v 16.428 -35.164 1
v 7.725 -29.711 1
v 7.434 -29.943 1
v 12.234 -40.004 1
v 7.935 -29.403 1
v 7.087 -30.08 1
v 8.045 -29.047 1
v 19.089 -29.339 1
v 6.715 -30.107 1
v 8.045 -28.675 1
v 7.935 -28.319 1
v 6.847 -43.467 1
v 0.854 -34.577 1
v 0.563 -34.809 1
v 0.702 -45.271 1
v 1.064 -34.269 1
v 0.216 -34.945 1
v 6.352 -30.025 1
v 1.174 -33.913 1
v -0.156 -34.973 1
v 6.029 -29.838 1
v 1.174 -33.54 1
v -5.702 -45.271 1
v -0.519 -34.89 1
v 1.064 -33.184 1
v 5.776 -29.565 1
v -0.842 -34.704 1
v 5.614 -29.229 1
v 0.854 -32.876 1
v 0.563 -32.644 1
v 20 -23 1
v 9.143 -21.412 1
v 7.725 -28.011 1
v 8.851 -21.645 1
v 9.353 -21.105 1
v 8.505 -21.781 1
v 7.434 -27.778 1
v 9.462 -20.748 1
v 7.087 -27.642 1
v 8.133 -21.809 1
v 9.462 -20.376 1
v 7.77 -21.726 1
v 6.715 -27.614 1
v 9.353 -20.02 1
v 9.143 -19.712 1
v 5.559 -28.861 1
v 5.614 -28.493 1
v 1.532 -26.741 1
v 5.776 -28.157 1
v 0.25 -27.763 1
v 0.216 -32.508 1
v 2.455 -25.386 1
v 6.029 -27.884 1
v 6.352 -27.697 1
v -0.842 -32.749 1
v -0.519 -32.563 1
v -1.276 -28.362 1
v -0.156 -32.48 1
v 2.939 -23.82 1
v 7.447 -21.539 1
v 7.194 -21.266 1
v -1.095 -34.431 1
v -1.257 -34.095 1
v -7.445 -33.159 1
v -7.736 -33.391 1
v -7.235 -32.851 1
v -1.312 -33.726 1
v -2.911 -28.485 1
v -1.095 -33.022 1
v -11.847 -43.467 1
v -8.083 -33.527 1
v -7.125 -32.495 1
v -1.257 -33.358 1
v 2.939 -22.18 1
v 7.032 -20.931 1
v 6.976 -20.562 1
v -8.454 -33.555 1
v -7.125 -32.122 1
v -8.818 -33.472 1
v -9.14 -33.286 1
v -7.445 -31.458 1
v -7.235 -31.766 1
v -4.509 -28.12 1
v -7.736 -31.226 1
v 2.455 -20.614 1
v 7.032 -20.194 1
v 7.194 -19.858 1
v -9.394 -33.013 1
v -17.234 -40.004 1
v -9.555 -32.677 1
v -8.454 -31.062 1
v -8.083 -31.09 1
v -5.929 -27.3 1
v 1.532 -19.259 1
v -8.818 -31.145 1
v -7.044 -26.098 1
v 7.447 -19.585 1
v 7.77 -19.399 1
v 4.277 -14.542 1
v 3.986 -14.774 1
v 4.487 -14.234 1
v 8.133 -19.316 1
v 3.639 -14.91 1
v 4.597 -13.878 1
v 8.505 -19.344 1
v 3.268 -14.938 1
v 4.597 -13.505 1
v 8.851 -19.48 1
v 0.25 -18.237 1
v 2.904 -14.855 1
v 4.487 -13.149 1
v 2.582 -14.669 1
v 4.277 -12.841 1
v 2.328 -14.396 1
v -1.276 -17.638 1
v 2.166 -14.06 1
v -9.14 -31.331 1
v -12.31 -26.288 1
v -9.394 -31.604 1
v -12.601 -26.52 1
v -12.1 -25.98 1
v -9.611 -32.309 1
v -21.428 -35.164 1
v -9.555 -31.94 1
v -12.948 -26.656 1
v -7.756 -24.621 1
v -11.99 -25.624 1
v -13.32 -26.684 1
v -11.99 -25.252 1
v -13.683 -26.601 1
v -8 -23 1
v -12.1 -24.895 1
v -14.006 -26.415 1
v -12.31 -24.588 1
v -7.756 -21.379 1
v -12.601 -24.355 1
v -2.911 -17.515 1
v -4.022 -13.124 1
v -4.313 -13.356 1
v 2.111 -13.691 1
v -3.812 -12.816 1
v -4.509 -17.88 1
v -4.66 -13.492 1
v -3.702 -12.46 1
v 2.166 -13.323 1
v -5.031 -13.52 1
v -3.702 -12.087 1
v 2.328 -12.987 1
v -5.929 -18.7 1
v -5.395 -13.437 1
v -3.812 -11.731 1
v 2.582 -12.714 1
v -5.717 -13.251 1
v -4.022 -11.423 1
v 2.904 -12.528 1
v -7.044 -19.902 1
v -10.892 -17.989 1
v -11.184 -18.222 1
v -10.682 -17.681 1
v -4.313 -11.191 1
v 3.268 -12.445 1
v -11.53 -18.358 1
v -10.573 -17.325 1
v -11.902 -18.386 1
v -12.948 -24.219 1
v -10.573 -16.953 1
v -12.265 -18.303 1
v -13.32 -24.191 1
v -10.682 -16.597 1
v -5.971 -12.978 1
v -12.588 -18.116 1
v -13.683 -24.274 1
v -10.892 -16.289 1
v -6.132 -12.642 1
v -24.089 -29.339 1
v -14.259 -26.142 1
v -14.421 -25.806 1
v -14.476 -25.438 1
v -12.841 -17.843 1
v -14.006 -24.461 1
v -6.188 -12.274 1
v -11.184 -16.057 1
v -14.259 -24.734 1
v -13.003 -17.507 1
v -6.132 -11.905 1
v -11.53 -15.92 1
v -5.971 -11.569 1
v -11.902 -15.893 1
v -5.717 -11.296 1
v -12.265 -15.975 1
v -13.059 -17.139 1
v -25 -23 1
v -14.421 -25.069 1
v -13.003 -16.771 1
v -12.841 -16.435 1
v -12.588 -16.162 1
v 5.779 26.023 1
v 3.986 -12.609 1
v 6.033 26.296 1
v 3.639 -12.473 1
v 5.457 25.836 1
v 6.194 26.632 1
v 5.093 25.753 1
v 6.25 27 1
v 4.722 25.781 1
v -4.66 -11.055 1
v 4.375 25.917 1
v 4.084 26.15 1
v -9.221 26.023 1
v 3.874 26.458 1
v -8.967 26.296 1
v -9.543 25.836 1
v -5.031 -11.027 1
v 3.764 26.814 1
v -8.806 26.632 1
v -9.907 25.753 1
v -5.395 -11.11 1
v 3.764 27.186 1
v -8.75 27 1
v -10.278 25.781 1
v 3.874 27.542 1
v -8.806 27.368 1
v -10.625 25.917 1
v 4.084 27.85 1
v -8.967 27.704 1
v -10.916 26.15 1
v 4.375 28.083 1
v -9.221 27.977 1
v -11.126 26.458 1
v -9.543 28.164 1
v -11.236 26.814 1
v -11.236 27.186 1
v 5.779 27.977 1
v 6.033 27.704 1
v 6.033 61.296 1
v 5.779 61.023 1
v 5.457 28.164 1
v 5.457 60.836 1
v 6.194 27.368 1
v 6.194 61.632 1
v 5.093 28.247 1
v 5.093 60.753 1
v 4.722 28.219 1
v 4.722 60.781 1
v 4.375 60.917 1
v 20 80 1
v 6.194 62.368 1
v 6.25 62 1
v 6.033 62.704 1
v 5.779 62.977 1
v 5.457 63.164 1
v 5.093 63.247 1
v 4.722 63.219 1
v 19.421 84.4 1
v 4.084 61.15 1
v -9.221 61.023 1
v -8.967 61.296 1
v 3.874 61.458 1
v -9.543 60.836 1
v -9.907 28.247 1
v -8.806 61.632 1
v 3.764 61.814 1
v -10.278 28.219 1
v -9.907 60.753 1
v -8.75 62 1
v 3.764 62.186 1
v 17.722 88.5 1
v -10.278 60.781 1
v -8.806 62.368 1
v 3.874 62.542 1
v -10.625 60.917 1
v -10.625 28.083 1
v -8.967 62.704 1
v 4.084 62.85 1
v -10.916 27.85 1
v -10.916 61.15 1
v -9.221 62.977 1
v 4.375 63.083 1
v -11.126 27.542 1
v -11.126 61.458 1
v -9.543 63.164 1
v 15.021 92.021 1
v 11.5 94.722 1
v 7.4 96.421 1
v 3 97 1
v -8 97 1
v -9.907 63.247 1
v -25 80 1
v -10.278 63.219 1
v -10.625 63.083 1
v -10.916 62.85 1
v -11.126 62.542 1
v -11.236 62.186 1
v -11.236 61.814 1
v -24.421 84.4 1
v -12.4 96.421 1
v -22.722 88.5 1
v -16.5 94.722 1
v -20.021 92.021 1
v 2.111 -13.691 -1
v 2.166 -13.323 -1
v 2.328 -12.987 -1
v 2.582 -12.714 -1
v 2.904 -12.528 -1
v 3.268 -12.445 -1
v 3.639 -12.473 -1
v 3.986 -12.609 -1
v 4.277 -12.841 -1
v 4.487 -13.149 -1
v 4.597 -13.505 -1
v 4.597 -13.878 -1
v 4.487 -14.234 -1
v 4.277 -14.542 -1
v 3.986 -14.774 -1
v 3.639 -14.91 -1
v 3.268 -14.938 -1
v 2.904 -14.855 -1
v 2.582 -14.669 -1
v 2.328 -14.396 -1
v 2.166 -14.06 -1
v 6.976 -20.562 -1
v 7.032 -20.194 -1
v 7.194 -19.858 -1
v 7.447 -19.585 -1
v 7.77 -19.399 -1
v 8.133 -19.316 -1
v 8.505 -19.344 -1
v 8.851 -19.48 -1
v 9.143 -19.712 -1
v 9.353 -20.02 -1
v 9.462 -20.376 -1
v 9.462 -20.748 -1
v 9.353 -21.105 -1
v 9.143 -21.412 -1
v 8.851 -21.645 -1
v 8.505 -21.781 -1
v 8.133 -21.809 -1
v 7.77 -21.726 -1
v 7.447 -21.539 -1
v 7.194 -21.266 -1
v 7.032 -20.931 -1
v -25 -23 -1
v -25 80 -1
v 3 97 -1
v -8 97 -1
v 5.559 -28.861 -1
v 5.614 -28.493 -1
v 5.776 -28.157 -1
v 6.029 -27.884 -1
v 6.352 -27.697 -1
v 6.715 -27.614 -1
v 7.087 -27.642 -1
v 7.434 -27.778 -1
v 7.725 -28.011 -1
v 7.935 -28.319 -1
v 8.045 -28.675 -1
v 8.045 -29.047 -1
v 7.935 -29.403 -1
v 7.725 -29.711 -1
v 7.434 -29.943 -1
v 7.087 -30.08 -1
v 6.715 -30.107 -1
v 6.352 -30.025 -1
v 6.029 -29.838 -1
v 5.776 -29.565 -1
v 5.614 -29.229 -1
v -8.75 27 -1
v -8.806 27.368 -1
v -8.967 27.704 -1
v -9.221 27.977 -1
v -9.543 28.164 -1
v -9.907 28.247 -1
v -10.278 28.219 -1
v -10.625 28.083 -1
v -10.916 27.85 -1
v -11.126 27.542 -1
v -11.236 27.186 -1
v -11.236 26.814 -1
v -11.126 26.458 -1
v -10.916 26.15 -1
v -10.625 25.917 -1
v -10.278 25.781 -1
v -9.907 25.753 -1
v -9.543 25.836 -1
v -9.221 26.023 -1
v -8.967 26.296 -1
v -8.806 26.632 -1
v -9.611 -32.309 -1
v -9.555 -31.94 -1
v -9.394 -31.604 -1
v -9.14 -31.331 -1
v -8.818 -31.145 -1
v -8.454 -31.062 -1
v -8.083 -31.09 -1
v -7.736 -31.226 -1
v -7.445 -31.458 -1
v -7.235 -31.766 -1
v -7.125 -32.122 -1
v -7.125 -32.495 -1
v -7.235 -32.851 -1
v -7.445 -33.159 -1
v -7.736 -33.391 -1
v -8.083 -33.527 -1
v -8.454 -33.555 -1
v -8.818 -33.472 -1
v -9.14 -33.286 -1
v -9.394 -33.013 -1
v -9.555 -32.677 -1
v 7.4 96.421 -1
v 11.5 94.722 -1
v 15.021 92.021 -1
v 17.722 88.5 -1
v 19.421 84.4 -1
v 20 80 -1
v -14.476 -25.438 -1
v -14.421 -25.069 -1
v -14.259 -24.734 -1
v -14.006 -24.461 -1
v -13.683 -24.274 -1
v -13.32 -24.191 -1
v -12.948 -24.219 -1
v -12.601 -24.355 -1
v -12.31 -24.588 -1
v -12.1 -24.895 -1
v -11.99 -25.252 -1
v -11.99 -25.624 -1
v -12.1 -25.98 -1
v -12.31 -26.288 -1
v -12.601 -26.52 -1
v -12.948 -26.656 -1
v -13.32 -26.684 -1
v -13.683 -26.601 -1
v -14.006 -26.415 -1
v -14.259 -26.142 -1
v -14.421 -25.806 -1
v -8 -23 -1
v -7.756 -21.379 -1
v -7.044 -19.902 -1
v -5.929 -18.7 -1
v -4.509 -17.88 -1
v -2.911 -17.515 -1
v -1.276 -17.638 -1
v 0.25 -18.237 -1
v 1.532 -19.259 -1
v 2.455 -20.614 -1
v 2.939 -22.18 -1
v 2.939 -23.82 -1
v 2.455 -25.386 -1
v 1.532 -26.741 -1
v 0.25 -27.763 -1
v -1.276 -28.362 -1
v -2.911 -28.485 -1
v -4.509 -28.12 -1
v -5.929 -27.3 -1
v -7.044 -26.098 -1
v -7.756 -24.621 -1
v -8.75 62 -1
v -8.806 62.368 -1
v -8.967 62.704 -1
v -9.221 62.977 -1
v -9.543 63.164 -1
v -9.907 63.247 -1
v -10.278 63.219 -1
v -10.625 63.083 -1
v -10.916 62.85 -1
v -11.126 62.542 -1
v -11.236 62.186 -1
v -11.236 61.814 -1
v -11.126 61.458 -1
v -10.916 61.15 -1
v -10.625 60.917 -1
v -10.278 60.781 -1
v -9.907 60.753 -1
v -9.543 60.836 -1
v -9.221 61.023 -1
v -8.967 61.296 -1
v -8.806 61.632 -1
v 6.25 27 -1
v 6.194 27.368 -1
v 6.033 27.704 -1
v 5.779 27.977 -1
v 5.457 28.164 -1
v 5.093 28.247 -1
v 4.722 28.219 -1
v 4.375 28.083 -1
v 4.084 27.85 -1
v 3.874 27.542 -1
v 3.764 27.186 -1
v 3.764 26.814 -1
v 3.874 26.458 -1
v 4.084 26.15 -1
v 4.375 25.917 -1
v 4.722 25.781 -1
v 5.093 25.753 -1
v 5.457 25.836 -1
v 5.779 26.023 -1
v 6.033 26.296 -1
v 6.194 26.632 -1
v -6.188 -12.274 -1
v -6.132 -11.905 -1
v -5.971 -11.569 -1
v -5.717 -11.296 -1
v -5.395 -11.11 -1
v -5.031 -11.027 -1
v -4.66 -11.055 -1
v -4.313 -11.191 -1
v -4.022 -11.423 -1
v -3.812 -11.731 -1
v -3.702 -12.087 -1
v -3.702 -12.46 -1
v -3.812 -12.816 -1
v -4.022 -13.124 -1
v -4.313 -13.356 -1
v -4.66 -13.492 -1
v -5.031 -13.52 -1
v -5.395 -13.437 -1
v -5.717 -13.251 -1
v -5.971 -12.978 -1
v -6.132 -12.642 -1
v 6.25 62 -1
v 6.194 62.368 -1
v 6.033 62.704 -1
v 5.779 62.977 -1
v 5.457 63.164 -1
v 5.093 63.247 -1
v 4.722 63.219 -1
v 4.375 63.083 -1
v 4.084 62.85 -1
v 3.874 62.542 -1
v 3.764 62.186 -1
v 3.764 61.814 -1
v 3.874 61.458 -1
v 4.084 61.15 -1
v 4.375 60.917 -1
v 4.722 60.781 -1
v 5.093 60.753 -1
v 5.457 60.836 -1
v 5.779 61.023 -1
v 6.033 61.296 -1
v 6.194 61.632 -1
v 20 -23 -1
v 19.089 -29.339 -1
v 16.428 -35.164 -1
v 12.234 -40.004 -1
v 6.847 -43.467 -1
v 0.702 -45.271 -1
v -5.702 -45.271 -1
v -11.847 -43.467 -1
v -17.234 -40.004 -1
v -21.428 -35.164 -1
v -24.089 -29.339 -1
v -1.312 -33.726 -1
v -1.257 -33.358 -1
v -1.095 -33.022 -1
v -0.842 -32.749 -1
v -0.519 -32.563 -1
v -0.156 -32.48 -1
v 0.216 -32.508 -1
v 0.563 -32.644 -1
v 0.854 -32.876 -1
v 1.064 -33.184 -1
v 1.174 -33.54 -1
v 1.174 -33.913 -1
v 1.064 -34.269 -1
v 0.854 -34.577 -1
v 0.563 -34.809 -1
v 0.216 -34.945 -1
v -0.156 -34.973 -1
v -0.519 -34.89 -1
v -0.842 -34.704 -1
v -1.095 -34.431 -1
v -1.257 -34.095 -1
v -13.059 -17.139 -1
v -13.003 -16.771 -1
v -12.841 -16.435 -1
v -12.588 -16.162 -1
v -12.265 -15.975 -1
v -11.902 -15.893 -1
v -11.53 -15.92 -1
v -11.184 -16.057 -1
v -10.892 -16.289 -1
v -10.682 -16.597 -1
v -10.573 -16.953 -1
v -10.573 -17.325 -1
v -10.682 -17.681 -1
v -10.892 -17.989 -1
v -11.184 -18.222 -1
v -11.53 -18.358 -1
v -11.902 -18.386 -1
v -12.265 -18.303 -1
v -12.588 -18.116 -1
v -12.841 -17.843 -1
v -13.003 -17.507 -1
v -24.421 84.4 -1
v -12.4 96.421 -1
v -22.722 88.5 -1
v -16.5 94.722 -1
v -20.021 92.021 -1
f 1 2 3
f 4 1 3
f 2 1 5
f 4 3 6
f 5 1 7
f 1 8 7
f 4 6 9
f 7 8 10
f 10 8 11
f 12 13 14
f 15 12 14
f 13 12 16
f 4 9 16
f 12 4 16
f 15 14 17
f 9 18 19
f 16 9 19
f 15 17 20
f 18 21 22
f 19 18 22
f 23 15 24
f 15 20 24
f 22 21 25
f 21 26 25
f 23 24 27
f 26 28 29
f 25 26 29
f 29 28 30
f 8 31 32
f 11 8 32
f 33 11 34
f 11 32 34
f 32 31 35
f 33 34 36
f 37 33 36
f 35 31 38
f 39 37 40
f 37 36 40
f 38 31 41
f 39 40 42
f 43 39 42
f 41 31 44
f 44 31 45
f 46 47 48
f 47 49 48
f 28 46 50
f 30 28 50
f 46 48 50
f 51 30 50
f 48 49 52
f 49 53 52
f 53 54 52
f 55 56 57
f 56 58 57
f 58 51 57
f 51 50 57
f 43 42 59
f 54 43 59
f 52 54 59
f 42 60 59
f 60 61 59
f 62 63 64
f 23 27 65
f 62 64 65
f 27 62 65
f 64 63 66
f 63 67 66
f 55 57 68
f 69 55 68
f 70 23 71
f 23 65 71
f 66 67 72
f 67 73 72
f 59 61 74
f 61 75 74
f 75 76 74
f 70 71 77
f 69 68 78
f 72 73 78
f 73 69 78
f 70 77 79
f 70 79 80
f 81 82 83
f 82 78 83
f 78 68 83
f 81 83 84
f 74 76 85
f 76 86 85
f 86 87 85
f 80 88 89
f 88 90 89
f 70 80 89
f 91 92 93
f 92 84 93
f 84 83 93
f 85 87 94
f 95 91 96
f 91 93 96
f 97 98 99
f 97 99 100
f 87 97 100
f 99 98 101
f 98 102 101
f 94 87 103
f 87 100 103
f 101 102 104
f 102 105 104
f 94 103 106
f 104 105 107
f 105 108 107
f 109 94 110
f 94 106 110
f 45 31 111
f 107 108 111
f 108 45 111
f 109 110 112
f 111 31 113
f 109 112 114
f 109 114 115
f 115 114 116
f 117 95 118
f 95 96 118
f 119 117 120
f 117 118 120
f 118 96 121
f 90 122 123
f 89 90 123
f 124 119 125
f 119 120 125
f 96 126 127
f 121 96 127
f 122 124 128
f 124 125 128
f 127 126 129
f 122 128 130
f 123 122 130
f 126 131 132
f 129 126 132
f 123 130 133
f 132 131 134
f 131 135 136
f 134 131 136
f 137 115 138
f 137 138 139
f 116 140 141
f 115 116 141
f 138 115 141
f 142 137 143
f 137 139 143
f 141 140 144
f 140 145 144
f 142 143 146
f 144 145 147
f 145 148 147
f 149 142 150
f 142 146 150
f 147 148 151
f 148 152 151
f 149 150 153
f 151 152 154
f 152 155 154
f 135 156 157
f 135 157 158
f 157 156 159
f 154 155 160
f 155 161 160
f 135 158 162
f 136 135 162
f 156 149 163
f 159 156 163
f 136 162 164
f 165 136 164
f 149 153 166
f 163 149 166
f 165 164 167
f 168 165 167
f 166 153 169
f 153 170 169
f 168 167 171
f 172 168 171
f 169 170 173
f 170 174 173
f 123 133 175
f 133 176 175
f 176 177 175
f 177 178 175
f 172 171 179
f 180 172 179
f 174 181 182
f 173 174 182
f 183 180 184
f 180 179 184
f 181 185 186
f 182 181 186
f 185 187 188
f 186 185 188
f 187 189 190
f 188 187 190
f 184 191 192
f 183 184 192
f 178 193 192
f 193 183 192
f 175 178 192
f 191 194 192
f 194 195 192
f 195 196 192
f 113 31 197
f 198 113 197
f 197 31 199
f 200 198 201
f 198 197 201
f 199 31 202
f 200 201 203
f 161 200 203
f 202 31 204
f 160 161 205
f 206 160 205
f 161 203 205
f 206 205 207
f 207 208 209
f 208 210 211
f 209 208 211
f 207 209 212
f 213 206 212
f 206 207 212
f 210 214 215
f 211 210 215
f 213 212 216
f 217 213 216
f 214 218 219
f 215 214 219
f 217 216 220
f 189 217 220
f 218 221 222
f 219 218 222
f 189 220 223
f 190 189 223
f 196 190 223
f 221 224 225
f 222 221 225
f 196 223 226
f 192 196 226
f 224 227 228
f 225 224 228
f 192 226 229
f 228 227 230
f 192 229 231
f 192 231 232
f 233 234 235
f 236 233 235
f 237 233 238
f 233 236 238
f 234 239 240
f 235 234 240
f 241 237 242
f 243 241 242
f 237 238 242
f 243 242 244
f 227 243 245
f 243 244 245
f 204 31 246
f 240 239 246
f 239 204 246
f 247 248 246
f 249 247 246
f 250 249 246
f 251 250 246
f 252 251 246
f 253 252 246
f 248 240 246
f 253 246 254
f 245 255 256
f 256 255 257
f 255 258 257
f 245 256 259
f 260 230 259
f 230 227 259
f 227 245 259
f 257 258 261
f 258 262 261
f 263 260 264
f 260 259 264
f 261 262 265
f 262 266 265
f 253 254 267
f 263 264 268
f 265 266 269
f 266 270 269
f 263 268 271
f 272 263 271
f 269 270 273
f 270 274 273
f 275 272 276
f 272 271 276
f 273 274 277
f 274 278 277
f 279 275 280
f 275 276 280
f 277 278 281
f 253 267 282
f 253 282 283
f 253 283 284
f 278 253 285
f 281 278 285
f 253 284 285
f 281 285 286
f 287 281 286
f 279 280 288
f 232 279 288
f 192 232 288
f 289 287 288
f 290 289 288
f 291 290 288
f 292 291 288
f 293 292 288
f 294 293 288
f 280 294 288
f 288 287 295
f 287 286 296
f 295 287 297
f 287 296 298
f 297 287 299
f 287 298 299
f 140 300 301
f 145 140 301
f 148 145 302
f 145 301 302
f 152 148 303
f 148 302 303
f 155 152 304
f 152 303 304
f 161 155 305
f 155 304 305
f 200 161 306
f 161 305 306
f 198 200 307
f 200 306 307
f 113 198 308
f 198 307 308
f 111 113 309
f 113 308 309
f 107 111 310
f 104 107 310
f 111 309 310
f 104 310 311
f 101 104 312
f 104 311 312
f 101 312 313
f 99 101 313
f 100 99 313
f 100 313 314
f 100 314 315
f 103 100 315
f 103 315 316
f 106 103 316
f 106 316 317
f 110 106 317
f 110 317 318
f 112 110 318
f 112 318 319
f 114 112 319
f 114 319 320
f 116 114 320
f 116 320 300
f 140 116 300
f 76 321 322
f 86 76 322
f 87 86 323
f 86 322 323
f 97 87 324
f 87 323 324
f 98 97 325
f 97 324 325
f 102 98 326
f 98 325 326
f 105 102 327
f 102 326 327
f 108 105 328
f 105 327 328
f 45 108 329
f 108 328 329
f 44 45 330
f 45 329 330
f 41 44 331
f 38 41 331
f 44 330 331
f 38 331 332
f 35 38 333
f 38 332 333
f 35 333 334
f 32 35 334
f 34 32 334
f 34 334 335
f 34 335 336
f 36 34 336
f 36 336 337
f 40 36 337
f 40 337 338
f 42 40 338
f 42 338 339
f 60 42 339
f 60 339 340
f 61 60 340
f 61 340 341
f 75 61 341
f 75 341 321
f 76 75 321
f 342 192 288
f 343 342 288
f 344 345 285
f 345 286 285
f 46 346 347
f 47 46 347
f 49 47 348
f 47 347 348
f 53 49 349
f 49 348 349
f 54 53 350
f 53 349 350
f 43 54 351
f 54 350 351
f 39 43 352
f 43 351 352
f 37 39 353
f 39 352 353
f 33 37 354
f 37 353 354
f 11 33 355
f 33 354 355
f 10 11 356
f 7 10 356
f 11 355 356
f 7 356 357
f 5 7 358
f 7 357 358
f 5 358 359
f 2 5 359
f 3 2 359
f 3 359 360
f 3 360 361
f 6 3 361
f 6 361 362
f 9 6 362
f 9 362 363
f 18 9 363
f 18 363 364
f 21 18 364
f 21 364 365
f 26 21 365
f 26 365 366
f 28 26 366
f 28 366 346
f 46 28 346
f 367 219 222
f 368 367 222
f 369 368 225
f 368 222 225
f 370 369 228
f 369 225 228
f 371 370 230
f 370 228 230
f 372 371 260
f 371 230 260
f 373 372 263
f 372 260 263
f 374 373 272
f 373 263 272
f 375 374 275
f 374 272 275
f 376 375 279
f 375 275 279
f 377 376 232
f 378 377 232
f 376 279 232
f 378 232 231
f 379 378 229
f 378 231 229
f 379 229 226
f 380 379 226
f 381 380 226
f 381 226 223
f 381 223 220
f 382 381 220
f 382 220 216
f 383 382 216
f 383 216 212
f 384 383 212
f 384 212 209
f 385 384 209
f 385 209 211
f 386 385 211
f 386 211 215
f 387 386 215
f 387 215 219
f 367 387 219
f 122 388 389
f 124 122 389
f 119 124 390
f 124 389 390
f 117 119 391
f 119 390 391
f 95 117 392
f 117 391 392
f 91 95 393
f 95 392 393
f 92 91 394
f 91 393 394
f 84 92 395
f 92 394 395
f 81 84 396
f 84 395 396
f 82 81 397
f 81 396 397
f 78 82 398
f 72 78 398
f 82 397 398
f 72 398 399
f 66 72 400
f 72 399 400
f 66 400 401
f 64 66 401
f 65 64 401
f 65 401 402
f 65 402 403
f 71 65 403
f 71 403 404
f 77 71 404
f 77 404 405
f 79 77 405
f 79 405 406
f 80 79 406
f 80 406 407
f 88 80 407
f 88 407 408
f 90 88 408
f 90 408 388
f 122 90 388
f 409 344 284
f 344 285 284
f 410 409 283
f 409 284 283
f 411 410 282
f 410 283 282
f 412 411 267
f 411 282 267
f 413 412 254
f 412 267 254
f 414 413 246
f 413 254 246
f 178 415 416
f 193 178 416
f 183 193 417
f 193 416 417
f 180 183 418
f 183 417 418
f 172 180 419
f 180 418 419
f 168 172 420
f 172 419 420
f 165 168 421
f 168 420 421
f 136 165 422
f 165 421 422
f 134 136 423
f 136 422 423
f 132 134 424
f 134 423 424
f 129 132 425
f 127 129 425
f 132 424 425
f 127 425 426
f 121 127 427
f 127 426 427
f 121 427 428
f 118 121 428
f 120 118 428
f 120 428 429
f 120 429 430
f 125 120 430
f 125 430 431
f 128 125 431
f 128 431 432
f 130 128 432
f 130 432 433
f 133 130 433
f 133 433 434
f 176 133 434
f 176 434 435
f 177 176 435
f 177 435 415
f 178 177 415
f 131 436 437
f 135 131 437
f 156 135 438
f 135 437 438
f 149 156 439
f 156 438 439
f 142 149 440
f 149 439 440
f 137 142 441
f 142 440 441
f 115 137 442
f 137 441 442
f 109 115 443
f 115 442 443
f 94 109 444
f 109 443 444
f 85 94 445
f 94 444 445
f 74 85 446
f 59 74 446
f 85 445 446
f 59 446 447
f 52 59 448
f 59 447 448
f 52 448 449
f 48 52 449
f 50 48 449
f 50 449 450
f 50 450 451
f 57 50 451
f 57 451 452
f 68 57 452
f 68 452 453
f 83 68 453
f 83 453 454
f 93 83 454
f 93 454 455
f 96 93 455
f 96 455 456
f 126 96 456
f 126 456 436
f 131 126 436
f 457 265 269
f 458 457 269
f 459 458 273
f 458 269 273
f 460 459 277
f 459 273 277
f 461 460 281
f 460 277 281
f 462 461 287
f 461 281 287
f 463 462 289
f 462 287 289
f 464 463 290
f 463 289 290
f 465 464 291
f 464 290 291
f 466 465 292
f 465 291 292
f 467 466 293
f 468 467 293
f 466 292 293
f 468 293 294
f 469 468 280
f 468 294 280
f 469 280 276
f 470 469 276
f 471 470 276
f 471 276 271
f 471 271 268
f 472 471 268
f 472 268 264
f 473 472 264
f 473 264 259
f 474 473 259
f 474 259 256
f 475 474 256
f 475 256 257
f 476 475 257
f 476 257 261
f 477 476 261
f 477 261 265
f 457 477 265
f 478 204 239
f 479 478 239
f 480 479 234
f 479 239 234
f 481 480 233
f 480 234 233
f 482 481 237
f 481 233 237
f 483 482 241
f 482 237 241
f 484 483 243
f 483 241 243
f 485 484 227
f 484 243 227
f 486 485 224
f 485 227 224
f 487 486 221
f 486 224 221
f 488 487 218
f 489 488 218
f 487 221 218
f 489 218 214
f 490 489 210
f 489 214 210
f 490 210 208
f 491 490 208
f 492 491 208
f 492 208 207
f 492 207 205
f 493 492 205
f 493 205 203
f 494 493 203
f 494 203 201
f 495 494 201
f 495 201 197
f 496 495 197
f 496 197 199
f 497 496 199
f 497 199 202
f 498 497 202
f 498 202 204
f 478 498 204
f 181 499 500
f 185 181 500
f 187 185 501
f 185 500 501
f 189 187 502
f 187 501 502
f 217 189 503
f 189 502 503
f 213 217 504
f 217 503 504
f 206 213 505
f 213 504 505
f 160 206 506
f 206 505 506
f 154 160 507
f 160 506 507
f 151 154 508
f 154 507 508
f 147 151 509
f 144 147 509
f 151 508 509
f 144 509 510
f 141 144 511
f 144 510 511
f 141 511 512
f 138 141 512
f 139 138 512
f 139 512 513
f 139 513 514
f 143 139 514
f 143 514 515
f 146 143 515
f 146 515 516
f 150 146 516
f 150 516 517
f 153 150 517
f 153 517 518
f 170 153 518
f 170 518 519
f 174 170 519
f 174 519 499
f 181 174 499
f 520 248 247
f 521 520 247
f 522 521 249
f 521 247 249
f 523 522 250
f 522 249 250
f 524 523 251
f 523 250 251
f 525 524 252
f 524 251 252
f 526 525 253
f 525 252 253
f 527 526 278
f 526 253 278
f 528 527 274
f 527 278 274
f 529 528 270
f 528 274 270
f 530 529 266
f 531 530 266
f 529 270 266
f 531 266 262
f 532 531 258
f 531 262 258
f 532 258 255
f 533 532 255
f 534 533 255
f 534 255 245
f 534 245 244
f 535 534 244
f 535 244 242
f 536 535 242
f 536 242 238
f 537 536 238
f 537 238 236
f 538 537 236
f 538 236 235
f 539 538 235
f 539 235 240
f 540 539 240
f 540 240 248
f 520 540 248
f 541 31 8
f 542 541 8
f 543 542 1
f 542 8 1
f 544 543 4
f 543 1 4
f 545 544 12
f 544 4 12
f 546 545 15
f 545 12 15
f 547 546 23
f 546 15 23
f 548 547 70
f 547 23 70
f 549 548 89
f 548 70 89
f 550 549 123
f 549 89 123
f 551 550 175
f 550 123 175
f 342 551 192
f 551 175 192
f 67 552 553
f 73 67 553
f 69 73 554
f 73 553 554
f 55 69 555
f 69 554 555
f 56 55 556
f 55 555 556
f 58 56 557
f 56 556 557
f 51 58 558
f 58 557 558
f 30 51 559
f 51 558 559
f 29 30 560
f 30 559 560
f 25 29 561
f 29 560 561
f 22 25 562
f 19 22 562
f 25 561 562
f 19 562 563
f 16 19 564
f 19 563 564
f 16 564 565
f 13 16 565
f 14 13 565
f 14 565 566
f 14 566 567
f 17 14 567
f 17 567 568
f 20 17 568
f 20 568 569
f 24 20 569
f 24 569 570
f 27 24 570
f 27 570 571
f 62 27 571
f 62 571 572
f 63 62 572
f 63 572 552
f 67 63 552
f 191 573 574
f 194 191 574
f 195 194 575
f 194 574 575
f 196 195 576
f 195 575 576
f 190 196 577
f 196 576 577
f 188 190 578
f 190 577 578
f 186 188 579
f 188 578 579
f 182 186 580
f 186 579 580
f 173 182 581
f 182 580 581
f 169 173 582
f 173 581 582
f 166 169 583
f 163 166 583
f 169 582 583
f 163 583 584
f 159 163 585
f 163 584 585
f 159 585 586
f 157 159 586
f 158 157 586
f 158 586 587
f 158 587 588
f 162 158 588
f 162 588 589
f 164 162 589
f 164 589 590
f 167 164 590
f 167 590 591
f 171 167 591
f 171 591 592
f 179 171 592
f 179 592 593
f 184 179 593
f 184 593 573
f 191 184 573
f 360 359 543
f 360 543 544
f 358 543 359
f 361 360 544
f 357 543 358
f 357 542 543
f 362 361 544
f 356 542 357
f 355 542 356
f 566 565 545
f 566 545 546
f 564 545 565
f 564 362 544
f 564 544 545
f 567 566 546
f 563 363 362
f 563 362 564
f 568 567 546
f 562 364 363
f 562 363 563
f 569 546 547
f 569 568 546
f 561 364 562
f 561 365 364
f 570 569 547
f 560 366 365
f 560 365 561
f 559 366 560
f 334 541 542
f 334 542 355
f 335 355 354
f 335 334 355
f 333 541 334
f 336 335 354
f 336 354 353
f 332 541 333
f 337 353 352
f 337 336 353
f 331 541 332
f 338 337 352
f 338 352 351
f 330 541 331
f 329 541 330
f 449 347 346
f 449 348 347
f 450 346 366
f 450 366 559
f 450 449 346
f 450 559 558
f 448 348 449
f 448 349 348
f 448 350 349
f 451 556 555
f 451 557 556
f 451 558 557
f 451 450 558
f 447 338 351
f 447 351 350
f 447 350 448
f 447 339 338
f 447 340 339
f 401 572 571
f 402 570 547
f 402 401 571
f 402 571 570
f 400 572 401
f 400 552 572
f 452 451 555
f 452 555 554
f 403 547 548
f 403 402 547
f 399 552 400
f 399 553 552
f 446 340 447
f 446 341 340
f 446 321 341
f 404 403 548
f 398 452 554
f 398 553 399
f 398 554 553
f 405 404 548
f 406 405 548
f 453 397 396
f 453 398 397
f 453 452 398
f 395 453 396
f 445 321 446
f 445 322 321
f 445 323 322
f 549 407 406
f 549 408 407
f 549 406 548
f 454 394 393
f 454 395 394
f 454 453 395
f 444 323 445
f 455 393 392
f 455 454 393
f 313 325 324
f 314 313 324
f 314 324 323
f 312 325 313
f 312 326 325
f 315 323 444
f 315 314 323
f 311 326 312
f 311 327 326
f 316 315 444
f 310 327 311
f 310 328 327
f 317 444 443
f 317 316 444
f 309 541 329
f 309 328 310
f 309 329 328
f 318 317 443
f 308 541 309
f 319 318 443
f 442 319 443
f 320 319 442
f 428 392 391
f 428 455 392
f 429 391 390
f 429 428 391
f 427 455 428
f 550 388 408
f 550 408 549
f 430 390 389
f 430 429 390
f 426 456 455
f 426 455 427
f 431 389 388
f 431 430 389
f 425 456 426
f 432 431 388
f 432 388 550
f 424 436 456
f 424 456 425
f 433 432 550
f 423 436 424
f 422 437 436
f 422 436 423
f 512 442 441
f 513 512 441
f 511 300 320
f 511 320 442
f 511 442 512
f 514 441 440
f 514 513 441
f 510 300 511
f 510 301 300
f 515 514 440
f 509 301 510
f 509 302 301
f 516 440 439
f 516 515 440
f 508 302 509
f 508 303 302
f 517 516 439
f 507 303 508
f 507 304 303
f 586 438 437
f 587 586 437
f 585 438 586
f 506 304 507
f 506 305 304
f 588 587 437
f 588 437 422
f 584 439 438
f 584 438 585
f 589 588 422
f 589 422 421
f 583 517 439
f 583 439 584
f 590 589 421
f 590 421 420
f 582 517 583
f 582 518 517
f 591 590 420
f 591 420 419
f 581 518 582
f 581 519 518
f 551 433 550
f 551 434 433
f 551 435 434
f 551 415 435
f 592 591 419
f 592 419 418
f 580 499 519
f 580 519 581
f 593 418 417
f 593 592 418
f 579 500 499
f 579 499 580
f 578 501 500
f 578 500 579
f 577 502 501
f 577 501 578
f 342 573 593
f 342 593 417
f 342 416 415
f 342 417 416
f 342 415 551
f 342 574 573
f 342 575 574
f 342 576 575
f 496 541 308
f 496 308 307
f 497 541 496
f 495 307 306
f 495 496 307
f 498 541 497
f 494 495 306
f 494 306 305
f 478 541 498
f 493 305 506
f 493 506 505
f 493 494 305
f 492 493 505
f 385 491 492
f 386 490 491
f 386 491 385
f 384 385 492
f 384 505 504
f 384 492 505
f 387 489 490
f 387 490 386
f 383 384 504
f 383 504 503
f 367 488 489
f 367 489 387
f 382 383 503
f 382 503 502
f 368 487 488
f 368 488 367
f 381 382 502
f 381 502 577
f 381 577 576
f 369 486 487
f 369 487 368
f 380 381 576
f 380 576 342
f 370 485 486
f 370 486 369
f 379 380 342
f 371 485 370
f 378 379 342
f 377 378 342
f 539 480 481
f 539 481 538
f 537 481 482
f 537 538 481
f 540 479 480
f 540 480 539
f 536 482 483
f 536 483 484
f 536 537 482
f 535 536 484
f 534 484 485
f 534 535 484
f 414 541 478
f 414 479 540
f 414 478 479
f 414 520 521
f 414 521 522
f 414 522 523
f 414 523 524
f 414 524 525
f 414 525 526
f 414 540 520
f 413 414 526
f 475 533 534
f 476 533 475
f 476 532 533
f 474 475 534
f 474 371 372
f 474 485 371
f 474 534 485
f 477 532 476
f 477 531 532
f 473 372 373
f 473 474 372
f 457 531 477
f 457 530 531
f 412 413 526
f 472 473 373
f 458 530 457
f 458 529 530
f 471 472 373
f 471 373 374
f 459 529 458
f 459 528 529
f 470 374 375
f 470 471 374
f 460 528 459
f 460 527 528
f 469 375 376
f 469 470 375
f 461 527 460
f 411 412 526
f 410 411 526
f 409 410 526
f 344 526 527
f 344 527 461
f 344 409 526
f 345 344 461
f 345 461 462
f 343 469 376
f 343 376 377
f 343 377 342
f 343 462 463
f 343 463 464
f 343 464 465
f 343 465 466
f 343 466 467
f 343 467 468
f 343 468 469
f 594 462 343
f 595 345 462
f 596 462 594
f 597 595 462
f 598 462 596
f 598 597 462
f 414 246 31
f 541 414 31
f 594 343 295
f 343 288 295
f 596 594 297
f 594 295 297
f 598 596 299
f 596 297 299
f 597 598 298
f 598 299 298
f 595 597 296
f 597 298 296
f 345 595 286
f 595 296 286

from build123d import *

# Parameters (mm, degrees)
RESSALTO_EXTRUS_O1_DEPTH = 1
ESBO_O2_R                = 5.5
CORTE_EXTRUS_O1_DEPTH    = 101.189819842
ESBO_O3_R                = 1.25
CORTE_EXTRUS_O2_DEPTH    = 101.189819842
ESBO_O8_R                = 1.25
CORTE_EXTRUS_O3_DEPTH    = 17


with BuildPart() as part:
    # Esboço1 → Ressalto-extrusão1 (new, symmetric)
    with BuildSketch(Plane.XY):
        with BuildLine():
            Line((-25, -23), (-25, 80))
            ThreePointArc((-25, 80), (-20.02081528, 92.02081528), (-8, 97))
            Line((-8, 97), (3, 97))
            ThreePointArc((3, 97), (15.02081528, 92.02081528), (20, 80))
            Line((20, 80), (20, -23))
            ThreePointArc((20, -23), (-2.5, -45.5), (-25, -23))
        make_face()
    extrude(amount=RESSALTO_EXTRUS_O1_DEPTH, both=True)

    # Esboço2 → Corte-extrusão1 (cut, through all)
    with BuildSketch(Plane(origin=(0, 0, -1), x_dir=(-1, 0, 0), z_dir=(0, 0, -1))):
        with Locations((2.5, -23)):
            Circle(ESBO_O2_R)
    extrude(amount=-CORTE_EXTRUS_O1_DEPTH, mode=Mode.SUBTRACT)

    # Esboço3 → Corte-extrusão2 (cut, through all)
    with BuildSketch(Plane(origin=(0, 0, -1), x_dir=(-1, 0, 0), z_dir=(0, 0, -1))):
        with Locations((0.062167861, -33.726461414)):
            Circle(ESBO_O3_R)
        with Locations((-6.808561241, -28.860945967)):
            Circle(ESBO_O3_R)
        with Locations((-8.226461414, -20.562167861)):
            Circle(ESBO_O3_R)
        with Locations((-3.360945967, -13.691438759)):
            Circle(ESBO_O3_R)
        with Locations((4.937832139, -12.273538586)):
            Circle(ESBO_O3_R)
        with Locations((11.808561241, -17.139054033)):
            Circle(ESBO_O3_R)
        with Locations((13.226461414, -25.437832139)):
            Circle(ESBO_O3_R)
        with Locations((8.360945967, -32.308561241)):
            Circle(ESBO_O3_R)
    extrude(amount=-CORTE_EXTRUS_O2_DEPTH, mode=Mode.SUBTRACT)

    # Esboço8 → Corte-extrusão3 (cut)
    with BuildSketch(Plane.XY.offset(1)):
        with Locations((-10, 62)):
            Circle(ESBO_O8_R)
        with Locations((-10, 27)):
            Circle(ESBO_O8_R)
        with Locations((5, 62)):
            Circle(ESBO_O8_R)
        with Locations((5, 27)):
            Circle(ESBO_O8_R)
    extrude(amount=-CORTE_EXTRUS_O3_DEPTH, mode=Mode.SUBTRACT)


solid = part.part
